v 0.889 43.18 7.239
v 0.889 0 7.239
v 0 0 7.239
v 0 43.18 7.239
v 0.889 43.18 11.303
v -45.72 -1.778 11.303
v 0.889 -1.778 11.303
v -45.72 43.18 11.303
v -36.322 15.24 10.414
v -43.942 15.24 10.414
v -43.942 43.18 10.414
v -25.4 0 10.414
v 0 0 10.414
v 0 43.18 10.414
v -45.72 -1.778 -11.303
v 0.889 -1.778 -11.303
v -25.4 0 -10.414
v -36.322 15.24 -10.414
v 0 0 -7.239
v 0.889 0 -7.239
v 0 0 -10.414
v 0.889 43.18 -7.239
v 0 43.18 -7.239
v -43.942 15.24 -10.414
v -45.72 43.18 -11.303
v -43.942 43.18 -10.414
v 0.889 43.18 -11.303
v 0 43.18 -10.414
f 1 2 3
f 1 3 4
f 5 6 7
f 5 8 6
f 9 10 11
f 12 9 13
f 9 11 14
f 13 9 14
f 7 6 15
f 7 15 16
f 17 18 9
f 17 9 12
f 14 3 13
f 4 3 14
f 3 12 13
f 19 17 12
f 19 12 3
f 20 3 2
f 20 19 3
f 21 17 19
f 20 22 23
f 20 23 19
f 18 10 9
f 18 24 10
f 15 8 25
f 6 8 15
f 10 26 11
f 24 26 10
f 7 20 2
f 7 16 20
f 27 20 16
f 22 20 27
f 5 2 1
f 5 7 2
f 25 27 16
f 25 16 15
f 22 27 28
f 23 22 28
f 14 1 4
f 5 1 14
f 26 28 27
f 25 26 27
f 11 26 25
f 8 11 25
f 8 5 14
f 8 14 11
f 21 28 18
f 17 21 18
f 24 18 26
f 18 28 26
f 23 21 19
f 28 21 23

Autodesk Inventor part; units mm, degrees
ref_plane "YZ Plane" through (0, 0, 0) normal (1, 0, 0) x (0, 1, 0)
ref_plane "XZ Plane" through (0, 0, 0) normal (0, 1, 0) x (-1, 0, 0)
ref_plane "XY Plane" through (0, 0, 0) normal (0, 0, 1) x (1, 0, 0)
sketch "Sketch2" plane through (0, 0, 0) normal (0, 0, 1) x (1, 0, 0)
  line L0 (-43.942, 43.18) -> (-43.942, 15.24)
  line L1 (-43.942, 15.24) -> (-36.322, 15.24)
  line L2 (-36.322, 15.24) -> (-25.4, 0)
  line L3 (-25.4, 0) -> (0, 0)
  line L4 (0, 0) -> (0, 43.18)
  line L5 (0.889, 43.18) -> (0.889, -1.778)
  line L6 (0.889, -1.778) -> (-45.72, -1.778)
  line L7 (-45.72, -1.778) -> (-45.72, 43.18)
  line L8 (-45.72, 43.18) -> (-43.942, 43.18)
  line L9 (0, 43.18) -> (0.889, 43.18)
  dimension "d1" = 7.62
  dimension "d2" = 27.94
  dimension "d3" = 10.922
  dimension "d4" = 43.18
  dimension "d5" = 1.778
  dimension "d6" = 0.889
  dimension "d7" = 1.778
  dimension "d10" = 44.958
  dimension "d11" = 46.609
extrude "Extrusion1" add sketch "Sketch2" along normal mid plane 20.828
sketch "Sketch5" plane through (0.889, -1.778, 10.414) normal (1, 0, 0) x (0, 0, -1)
  line L0 (0, 44.958) -> (20.828, 44.958) projected
  line L1 (3.175, 44.958) -> (17.653, 44.958)
  line L2 (17.653, 44.958) -> (17.653, 1.778)
  line L3 (17.653, 1.778) -> (3.175, 1.778)
  line L4 (3.175, 1.778) -> (3.175, 44.958)
  line L5 (0, 1.778) -> (20.828, 1.778) projected
  line L6 (0, 44.958) -> (20.828, 1.778) construction
  line L7 (3.175, 1.778) -> (17.653, 44.958) construction
  point P0 (10.414, 1.778)
  point P1 (10.414, 23.368)
  dimension "d14" = 14.478
extrude "Extrusion2" cut sketch "Sketch5" against normal up to next
sketch "Sketch6" plane through (0, 0, 10.414) normal (0, 0, 1) x (1, 0, 0)
  line L0 (-45.72, 43.18) -> (0.889, 43.18)
  line L1 (0.889, 43.18) -> (0.889, -1.778)
  line L2 (0.889, -1.778) -> (-45.72, -1.778)
  line L3 (-45.72, -1.778) -> (-45.72, 43.18)
extrude "Extrusion3" add sketch "Sketch6" along normal blind 0.889
mirror "Mirror1" about plane through (0, 0, 0) normal (0, 0, 1) of "Extrusion3"
properties part number "SteerServoInsert"
